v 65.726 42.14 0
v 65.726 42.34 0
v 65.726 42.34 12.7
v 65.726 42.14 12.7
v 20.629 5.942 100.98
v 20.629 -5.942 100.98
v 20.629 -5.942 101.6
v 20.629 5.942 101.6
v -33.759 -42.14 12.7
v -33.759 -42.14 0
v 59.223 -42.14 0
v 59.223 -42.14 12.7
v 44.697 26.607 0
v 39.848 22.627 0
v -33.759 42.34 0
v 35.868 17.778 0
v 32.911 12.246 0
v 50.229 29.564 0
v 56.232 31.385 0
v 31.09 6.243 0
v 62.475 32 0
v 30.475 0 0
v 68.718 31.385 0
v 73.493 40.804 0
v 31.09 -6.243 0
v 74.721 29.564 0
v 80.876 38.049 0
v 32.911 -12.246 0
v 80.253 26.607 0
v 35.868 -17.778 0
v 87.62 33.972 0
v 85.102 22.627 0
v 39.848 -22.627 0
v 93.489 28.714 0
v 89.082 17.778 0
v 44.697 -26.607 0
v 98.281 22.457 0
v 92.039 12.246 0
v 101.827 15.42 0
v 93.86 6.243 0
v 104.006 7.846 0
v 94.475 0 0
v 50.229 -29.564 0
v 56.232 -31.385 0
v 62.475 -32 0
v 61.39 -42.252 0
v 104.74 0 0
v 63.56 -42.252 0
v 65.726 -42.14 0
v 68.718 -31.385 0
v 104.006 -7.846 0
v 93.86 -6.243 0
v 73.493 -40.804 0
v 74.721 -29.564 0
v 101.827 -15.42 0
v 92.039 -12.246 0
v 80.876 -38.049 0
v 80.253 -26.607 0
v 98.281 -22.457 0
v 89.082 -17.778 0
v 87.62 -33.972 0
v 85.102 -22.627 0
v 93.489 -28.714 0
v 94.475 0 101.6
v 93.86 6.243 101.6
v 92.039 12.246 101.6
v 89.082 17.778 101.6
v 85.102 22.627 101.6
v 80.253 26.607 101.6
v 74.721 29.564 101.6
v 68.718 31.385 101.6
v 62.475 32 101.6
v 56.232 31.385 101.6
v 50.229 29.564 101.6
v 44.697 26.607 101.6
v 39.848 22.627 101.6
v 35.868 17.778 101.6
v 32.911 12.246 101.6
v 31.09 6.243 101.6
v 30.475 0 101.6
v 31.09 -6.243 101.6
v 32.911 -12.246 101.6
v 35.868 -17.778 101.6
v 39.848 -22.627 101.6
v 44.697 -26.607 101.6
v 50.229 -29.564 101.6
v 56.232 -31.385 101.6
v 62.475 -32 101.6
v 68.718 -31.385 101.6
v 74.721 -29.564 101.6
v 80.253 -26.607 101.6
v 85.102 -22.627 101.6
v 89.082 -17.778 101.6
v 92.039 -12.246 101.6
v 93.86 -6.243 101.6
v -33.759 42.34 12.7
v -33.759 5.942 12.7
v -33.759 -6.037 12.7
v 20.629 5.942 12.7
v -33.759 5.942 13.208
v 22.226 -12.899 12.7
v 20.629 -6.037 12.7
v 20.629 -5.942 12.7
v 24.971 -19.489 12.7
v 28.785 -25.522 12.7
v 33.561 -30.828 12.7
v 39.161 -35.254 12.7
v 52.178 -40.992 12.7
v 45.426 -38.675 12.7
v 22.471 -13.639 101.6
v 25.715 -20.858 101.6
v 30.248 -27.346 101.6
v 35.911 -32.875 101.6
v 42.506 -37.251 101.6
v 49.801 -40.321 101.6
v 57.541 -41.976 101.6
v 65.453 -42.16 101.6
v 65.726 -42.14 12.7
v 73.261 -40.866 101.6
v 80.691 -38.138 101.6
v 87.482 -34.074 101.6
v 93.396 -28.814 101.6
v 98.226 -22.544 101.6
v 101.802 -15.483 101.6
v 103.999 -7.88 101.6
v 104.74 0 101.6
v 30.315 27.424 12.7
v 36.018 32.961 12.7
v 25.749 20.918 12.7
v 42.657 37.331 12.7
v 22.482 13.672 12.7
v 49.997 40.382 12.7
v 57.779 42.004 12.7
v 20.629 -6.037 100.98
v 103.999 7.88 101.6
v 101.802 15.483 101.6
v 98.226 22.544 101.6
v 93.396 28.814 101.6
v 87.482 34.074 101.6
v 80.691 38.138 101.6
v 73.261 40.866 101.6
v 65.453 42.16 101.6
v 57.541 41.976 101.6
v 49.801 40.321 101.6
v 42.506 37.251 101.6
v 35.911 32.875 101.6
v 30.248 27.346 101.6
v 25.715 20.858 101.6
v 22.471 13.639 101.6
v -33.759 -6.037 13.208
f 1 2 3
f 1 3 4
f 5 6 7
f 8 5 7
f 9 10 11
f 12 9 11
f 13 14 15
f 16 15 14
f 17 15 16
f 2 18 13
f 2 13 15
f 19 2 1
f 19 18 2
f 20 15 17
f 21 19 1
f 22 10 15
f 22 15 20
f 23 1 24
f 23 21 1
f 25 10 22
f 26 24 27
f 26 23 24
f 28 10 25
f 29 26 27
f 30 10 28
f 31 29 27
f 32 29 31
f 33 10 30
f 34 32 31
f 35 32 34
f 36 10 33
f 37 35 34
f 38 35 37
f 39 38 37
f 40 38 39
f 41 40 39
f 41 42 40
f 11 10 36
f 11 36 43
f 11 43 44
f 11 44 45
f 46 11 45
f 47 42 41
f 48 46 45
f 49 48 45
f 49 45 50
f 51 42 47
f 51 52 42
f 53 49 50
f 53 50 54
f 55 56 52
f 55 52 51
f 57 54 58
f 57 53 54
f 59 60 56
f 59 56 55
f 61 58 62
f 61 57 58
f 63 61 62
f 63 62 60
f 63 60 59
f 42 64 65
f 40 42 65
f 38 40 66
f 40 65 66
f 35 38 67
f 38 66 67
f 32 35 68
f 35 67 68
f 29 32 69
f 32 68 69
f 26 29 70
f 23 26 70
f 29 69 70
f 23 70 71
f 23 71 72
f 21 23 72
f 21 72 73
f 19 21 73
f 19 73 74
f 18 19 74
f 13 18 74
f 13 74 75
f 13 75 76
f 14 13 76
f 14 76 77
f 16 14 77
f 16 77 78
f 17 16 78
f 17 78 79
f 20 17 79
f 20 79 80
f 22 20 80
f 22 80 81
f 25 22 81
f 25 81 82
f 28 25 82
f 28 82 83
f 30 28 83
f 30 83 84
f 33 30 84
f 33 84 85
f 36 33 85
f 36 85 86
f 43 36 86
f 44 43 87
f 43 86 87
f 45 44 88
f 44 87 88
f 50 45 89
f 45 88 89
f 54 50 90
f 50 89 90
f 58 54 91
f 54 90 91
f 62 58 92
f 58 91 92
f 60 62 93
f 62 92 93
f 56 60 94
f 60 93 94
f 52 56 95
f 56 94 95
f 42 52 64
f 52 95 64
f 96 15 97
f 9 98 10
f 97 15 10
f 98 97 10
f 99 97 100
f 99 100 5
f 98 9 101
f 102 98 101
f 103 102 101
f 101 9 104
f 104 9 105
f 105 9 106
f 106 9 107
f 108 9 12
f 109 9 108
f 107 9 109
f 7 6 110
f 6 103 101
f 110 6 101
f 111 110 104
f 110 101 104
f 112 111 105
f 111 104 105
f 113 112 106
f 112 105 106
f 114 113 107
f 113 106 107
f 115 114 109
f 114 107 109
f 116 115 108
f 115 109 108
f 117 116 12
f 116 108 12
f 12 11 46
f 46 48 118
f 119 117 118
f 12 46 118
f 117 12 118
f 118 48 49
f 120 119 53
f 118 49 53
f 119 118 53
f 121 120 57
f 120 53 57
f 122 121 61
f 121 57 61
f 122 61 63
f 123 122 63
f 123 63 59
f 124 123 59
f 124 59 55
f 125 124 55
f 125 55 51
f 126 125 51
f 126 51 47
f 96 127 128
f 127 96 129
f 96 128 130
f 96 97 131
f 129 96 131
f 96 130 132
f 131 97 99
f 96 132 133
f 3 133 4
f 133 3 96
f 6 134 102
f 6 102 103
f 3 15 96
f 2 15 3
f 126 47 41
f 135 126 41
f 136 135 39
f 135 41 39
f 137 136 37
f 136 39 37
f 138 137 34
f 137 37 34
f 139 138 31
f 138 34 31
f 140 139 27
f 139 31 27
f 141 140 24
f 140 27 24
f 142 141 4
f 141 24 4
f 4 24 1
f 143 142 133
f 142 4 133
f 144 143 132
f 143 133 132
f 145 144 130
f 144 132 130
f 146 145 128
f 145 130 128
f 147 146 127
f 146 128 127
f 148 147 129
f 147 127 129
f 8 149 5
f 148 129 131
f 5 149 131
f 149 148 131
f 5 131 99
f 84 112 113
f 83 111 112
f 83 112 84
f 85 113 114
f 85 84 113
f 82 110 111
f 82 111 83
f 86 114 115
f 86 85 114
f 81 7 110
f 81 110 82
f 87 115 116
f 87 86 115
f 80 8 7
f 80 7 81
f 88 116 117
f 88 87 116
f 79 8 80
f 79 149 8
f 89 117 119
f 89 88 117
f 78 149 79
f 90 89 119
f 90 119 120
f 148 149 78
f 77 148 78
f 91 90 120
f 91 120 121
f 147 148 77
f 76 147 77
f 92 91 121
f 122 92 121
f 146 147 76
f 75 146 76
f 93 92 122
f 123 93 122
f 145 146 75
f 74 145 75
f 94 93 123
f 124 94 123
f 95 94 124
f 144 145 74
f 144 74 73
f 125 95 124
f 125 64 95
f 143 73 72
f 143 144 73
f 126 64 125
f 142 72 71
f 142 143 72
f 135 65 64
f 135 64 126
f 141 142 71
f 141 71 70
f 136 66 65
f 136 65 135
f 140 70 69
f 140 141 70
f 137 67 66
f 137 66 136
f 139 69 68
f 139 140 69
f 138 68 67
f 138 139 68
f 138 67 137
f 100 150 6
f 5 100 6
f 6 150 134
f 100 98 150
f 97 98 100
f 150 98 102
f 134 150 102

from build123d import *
from build123d import SkipClean  # not in build123d's __all__

# Parameters (mm, degrees)
F0_R     = 42.2654661293
F1_DEPTH = 101.6
F2_W     = 99.4848832185
F2_H     = 84.4806035552
F3_DEPTH = 12.7
F4_R     = 31.9997887228
F5_DEPTH = 101.601
F6_W     = 54.3876717536
F6_H     = 11.9783656307
F7_DEPTH = 101.6
F9_DEPTH = 48.3780729043


with BuildPart() as f1:
    # F0 (on Top) → F1 (new body)
    with BuildSketch(Plane.XY):
        with Locations((62.4748729169, 0)):
            Circle(F0_R)
    extrude(amount=F1_DEPTH)

    # F2 (on face) → F3 (join)
    with BuildSketch(Plane(origin=(0, 0, 0), x_dir=(1, 0, 0), z_dir=(0, 0, -1))):
        with Locations((15.9839019028, -0.1000886066)):
            Rectangle(F2_W, F2_H)
    extrude(amount=-F3_DEPTH)

    # F4 (on face) → F5 (cut, through all)
    with BuildSketch(Plane.XY.offset(101.6)):
        with Locations((62.4748729169, 0)):
            Circle(F4_R)
    extrude(amount=-F5_DEPTH, mode=Mode.SUBTRACT)

    # F6 (on face) → F7 (join)
    with BuildSketch(Plane.XY.offset(12.7)):
        with Locations((-6.5647038297, -0.0474997047)):
            Rectangle(F6_W, F6_H)
    with SkipClean():  # cleaning this boolean's faces spoils the solid; the shape is the same uncleaned
        extrude(amount=F7_DEPTH)

    # F8 (on face) → F9 (cut, through all)
    with BuildSketch(Plane.XZ.offset(6.0366825201)):
        Polygon((-33.7585397065, 13.207843317), (20.6291320471, 100.9798197685), (20.6291320471, 114.3), (-33.7585397065, 114.3), align=None)
    with SkipClean():  # cleaning this boolean's faces spoils the solid; the shape is the same uncleaned
        extrude(amount=-F9_DEPTH, mode=Mode.SUBTRACT)


solid = f1.part
